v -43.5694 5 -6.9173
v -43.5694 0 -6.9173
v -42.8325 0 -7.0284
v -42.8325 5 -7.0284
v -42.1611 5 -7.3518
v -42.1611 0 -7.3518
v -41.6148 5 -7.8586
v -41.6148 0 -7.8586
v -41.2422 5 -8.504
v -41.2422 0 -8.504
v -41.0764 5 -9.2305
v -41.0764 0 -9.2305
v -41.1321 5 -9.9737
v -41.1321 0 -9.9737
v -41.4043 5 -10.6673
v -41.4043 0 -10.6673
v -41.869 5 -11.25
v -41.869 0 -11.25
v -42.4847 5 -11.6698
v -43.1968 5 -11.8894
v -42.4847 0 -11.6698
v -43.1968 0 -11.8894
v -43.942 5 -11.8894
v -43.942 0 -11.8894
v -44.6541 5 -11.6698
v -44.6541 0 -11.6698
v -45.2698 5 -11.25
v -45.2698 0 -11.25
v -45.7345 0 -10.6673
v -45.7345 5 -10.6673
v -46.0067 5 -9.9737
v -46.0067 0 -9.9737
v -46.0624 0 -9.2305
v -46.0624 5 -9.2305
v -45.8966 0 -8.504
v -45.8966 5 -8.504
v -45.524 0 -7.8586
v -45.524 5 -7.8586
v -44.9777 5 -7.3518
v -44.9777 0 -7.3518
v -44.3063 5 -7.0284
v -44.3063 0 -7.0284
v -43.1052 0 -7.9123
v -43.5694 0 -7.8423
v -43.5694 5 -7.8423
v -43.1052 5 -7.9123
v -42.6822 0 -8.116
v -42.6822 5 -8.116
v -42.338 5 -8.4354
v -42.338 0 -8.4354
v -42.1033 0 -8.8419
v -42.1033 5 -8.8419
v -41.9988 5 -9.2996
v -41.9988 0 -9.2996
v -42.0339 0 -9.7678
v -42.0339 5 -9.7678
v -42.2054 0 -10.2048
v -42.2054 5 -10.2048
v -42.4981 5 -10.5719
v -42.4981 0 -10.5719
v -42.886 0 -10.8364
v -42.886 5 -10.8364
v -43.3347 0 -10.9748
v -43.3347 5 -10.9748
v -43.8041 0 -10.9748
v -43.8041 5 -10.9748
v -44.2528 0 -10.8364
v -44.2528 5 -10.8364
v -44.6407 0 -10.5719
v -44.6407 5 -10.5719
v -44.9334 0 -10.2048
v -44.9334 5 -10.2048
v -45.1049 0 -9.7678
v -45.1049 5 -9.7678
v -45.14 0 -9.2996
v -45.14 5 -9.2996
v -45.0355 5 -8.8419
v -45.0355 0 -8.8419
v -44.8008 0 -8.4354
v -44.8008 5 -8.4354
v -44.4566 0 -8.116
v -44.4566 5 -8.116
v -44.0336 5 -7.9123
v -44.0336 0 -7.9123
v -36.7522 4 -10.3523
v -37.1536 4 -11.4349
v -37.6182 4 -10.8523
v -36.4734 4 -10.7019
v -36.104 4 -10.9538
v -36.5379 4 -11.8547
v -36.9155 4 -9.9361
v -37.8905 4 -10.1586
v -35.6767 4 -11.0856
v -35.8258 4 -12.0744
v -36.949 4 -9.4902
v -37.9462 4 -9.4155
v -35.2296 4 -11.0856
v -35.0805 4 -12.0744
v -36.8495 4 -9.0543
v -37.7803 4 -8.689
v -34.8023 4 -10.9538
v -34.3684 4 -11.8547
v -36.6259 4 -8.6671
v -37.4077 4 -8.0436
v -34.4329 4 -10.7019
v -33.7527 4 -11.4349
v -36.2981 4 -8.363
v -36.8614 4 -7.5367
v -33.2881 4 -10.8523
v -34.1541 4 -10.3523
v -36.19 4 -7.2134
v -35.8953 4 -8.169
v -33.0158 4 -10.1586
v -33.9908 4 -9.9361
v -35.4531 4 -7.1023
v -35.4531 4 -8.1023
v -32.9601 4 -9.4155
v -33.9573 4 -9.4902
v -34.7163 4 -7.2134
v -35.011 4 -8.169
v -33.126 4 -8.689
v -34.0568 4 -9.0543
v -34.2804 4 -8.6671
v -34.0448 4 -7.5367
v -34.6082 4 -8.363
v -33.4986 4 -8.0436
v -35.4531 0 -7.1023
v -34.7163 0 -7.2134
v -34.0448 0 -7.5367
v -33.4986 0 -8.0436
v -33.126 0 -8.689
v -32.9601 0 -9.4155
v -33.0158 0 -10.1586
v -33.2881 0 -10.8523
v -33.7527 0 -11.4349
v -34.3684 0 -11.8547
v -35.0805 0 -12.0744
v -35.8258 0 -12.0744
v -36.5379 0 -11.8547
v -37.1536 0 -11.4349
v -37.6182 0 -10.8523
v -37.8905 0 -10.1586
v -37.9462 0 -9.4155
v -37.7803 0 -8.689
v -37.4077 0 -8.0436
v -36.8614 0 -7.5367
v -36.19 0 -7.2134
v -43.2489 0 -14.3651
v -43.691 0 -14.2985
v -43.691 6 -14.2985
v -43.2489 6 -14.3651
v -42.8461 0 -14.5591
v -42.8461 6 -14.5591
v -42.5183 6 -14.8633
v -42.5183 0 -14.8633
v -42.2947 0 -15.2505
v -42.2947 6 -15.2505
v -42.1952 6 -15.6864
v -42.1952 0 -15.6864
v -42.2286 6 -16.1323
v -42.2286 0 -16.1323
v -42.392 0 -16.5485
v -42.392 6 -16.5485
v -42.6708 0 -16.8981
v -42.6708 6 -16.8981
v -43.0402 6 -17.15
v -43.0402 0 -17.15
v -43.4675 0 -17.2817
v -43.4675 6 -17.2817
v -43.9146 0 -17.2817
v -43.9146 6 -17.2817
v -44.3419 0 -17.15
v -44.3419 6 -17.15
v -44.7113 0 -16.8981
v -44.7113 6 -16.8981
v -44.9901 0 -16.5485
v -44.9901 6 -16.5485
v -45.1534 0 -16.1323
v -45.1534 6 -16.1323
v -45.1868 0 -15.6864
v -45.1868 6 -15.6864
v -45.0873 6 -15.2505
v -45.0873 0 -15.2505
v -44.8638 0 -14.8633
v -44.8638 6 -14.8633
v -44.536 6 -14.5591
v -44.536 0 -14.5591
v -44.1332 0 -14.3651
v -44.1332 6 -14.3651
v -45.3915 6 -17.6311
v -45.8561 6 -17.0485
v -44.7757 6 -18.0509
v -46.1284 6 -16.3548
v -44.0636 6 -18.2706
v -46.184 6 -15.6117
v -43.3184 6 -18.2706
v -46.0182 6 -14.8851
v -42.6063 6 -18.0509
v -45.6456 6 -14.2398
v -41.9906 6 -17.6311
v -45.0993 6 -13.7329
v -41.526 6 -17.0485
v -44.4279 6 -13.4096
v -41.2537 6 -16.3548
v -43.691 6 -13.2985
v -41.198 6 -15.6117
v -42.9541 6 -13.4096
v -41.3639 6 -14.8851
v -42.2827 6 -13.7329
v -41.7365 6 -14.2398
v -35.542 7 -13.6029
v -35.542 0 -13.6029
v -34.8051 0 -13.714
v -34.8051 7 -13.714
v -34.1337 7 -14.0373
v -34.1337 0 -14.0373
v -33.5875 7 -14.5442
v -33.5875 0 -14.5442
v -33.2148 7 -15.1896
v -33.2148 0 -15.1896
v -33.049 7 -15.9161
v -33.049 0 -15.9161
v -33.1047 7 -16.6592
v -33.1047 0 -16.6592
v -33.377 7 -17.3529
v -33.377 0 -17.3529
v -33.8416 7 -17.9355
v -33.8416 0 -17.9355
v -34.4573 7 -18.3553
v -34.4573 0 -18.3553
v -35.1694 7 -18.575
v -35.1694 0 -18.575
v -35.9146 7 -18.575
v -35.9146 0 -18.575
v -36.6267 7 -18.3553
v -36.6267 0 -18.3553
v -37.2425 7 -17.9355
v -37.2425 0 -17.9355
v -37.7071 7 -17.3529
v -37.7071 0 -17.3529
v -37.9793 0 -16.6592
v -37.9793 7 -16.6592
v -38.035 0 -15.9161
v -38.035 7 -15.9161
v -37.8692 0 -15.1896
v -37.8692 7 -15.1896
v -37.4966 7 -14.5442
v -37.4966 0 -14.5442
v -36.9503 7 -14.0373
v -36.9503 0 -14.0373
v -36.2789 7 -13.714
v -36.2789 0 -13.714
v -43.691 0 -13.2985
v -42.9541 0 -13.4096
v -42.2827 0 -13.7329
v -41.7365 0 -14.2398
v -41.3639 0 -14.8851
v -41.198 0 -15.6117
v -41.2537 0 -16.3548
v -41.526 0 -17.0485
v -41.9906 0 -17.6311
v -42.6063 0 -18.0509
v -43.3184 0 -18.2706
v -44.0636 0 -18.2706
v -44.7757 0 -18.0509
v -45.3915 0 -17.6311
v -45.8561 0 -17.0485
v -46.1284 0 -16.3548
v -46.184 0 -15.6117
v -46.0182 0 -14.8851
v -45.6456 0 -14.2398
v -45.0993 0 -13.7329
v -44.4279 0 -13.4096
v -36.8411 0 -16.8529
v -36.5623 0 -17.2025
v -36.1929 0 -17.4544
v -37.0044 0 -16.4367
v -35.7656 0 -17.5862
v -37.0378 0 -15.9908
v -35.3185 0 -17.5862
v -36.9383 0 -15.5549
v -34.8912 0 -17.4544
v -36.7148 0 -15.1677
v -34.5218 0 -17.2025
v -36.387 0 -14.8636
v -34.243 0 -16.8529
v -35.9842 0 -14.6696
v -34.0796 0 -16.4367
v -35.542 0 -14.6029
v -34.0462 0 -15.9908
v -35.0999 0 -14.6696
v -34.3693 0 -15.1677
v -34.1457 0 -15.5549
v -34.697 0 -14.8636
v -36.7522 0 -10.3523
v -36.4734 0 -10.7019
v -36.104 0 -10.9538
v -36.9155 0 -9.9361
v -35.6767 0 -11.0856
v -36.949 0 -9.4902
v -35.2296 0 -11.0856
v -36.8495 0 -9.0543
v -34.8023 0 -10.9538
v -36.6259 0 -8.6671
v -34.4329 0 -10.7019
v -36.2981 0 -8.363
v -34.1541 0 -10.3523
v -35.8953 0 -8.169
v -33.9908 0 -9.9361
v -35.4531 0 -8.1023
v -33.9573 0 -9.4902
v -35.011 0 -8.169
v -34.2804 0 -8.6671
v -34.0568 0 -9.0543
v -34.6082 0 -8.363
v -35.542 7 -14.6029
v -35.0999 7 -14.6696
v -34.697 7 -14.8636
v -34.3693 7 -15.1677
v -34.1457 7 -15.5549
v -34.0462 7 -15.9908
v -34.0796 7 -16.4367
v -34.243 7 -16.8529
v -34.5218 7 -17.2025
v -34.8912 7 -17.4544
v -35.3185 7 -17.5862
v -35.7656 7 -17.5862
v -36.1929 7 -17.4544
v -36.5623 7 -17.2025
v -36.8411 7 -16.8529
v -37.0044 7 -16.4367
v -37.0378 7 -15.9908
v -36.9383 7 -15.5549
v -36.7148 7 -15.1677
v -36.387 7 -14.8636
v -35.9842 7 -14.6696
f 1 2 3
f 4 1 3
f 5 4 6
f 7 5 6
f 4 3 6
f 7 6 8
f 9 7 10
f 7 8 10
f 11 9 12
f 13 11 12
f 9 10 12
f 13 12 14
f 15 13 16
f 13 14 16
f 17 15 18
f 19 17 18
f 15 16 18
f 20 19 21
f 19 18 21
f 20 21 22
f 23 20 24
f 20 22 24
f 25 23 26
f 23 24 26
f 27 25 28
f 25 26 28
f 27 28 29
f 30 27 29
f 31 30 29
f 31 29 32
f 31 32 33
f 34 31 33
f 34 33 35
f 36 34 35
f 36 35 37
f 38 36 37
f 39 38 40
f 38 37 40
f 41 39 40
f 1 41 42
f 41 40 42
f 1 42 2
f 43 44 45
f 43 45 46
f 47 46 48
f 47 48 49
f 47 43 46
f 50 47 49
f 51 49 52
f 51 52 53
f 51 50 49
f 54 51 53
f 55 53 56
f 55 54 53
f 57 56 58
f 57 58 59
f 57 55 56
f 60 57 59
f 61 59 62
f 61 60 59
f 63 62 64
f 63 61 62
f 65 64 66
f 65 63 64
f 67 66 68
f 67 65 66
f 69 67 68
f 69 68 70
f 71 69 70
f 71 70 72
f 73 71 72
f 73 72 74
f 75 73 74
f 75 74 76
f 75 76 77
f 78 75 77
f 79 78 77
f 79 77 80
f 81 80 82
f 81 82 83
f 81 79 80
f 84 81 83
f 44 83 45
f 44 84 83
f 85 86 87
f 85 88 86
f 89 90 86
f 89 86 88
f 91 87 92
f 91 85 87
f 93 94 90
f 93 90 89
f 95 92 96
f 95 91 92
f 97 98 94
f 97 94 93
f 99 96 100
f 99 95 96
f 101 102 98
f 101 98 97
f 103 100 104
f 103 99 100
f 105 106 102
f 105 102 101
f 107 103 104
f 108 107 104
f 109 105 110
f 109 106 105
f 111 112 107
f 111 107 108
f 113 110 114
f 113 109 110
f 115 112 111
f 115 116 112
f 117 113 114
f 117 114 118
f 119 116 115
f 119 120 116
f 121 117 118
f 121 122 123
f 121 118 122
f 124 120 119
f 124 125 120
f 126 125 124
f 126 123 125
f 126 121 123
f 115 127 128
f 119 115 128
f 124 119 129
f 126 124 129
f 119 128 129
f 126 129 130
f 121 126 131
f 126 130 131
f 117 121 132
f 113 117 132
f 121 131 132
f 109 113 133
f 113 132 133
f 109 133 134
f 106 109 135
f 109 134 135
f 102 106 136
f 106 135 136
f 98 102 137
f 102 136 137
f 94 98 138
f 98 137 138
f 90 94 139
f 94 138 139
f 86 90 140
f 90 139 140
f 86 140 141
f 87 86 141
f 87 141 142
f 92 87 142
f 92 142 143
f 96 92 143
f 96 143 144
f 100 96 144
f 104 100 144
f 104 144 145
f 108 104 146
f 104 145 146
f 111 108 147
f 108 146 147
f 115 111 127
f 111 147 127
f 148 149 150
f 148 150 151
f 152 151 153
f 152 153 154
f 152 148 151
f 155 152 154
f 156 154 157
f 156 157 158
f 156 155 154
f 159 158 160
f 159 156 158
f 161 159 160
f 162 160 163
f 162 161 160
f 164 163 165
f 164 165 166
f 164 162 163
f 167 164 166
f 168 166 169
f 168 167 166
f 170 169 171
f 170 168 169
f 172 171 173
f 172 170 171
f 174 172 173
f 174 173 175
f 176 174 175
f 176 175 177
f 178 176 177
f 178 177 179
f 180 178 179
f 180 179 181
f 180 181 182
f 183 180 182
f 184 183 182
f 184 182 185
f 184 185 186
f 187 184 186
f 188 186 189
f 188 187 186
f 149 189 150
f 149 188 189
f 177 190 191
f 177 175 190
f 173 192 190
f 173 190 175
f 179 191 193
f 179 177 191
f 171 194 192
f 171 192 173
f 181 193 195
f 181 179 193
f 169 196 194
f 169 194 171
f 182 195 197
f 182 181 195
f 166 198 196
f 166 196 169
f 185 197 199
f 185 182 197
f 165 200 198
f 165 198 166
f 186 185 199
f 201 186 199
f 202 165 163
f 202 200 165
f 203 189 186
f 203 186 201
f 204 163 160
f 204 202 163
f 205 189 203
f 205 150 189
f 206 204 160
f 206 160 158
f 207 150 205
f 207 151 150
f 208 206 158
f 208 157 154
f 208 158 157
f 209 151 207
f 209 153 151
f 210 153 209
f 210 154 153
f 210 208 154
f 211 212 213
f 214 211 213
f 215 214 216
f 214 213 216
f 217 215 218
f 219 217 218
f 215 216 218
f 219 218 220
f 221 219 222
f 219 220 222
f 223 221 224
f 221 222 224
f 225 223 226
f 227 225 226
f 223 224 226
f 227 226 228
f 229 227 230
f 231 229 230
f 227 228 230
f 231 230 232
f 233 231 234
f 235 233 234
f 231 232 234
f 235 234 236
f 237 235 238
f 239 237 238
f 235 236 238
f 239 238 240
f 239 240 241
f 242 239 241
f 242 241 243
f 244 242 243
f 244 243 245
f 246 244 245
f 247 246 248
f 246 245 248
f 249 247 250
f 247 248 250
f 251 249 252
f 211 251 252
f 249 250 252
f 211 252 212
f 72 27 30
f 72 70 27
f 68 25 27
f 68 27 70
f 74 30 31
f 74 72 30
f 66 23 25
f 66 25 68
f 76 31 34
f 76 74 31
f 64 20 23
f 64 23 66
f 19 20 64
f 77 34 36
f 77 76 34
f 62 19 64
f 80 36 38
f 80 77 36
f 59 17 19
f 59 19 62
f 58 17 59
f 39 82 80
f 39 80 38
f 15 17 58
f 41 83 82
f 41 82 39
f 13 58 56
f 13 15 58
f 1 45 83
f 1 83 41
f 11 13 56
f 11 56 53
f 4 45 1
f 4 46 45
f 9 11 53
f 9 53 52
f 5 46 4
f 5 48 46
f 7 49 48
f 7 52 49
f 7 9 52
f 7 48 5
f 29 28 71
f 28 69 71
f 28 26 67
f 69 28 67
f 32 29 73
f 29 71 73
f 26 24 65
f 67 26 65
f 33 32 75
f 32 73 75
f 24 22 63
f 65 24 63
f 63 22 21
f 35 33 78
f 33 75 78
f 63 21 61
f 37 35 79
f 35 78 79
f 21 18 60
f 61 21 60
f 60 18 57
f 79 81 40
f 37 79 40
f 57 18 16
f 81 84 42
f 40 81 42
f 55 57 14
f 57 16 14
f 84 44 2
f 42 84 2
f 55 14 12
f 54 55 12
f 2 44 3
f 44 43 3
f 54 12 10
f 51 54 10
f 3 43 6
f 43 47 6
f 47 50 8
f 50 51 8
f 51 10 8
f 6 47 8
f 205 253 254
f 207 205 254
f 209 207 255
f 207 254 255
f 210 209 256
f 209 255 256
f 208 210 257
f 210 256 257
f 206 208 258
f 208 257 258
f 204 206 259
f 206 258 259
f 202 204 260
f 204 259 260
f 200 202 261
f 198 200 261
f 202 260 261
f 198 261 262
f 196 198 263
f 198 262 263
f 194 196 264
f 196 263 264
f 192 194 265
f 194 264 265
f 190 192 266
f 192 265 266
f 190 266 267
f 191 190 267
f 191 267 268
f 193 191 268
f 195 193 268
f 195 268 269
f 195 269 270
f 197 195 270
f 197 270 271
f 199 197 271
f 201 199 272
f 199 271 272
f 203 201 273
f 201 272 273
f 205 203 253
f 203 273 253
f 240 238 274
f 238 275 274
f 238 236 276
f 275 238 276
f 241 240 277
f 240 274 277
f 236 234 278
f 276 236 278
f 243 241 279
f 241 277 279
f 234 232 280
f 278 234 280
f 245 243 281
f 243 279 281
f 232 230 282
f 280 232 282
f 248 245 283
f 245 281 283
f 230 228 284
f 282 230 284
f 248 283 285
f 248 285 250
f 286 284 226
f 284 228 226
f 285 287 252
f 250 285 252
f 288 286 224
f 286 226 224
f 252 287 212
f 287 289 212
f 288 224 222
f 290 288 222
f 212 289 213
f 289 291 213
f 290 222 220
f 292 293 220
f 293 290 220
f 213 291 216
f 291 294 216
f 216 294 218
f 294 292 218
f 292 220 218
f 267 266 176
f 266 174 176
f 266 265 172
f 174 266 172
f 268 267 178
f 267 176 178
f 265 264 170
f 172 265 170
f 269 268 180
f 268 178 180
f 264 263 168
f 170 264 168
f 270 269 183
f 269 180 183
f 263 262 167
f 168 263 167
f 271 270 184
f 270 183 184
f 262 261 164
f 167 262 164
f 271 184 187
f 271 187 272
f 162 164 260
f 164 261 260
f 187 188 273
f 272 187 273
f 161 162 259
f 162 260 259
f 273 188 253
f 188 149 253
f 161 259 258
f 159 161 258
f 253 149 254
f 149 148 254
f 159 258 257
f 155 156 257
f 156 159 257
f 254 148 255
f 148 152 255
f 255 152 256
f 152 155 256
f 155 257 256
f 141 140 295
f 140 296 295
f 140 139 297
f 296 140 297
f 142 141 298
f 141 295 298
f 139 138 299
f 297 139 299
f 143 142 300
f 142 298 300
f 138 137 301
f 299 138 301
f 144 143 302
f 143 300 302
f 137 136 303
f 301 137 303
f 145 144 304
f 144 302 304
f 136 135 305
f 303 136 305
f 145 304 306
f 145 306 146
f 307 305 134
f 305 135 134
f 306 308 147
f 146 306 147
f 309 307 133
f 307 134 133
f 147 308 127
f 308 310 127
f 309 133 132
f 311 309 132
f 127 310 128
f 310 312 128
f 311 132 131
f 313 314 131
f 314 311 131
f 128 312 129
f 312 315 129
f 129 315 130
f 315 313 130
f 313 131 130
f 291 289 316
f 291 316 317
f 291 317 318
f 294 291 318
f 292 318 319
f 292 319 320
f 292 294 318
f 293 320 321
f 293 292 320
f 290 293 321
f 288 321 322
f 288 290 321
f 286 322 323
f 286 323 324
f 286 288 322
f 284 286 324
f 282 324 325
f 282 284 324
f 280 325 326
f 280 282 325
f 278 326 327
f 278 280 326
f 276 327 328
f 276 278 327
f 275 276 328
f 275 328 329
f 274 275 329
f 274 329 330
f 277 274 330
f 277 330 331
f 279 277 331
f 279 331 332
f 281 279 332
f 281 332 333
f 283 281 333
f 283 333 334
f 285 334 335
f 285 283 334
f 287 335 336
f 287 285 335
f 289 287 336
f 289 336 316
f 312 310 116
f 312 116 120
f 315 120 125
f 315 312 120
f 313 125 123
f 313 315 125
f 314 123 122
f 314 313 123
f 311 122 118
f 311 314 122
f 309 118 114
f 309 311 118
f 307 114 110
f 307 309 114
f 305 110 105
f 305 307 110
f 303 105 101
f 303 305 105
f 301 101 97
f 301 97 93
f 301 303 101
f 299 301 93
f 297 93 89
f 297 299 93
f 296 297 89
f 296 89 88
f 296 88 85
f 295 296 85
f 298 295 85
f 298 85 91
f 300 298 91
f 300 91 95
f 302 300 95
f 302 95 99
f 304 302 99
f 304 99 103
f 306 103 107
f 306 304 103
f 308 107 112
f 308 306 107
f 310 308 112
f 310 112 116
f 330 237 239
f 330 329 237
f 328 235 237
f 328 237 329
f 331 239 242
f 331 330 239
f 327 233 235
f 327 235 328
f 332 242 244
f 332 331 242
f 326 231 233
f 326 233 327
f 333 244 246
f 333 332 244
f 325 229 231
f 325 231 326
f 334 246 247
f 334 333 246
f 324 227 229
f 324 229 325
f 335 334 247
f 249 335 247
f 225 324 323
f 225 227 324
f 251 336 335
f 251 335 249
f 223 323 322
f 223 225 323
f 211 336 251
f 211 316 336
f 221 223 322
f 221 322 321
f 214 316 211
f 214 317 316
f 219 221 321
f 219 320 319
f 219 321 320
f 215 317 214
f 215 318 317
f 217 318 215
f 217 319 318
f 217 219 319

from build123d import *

# Parameters (mm, degrees)
SKETCH1_R           = 2.5
SKETCH1_R_2         = 1.575
BOSS_EXTRUDE1_DEPTH = 5
SKETCH2_R           = 2.5
SKETCH2_R_2         = 1.5
BOSS_EXTRUDE2_DEPTH = 4
SKETCH3_R           = 2.5
SKETCH3_R_2         = 1.5
BOSS_EXTRUDE3_DEPTH = 6
SKETCH4_R           = 2.5
SKETCH4_R_2         = 1.5
BOSS_EXTRUDE4_DEPTH = 7


with BuildPart() as part:
    # Sketch1 → Boss-Extrude1 (new body)
    with BuildSketch(Plane(origin=(0, 0, 0), x_dir=(1, 0, 0), z_dir=(0, 1, 0))):
        with Locations(Location((-43.569408025, 9.417348367, 0), (0, 0, 270))):  # turned: the seam where the file's is
            Circle(SKETCH1_R)
        with Locations(Location((-43.569408025, 9.417348367, 0), (0, 0, 270))):  # turned: the seam where the file's is
            Circle(SKETCH1_R_2, mode=Mode.SUBTRACT)
    extrude(amount=BOSS_EXTRUDE1_DEPTH)


with BuildPart() as body_2:
    # Sketch2 → Boss-Extrude2 (new body)
    with BuildSketch(Plane(origin=(0, 0, 0), x_dir=(1, 0, 0), z_dir=(0, 1, 0))):
        with Locations(Location((-35.45314898, 9.602309879, 0), (0, 0, 270))):  # turned: the seam where the file's is
            Circle(SKETCH2_R)
        with Locations(Location((-35.45314898, 9.602309879, 0), (0, 0, 270))):  # turned: the seam where the file's is
            Circle(SKETCH2_R_2, mode=Mode.SUBTRACT)
    extrude(amount=BOSS_EXTRUDE2_DEPTH)


with BuildPart() as body_3:
    # Sketch3 → Boss-Extrude3 (new body)
    with BuildSketch(Plane(origin=(0, 0, 0), x_dir=(1, 0, 0), z_dir=(0, 1, 0))):
        with Locations(Location((-43.69103714, 15.798498794, 0), (0, 0, 270))):  # turned: the seam where the file's is
            Circle(SKETCH3_R)
        with Locations(Location((-43.69103714, 15.798498794, 0), (0, 0, 270))):  # turned: the seam where the file's is
            Circle(SKETCH3_R_2, mode=Mode.SUBTRACT)
    extrude(amount=BOSS_EXTRUDE3_DEPTH)


with BuildPart() as body_4:
    # Sketch4 → Boss-Extrude4 (new body)
    with BuildSketch(Plane(origin=(0, 0, 0), x_dir=(1, 0, 0), z_dir=(0, 1, 0))):
        with Locations(Location((-35.542029736, 16.102915737, 0), (0, 0, 270))):  # turned: the seam where the file's is
            Circle(SKETCH4_R)
        with Locations(Location((-35.542029736, 16.102915737, 0), (0, 0, 270))):  # turned: the seam where the file's is
            Circle(SKETCH4_R_2, mode=Mode.SUBTRACT)
    extrude(amount=BOSS_EXTRUDE4_DEPTH)


solid = Compound([part.part, body_2.part, body_3.part, body_4.part])
